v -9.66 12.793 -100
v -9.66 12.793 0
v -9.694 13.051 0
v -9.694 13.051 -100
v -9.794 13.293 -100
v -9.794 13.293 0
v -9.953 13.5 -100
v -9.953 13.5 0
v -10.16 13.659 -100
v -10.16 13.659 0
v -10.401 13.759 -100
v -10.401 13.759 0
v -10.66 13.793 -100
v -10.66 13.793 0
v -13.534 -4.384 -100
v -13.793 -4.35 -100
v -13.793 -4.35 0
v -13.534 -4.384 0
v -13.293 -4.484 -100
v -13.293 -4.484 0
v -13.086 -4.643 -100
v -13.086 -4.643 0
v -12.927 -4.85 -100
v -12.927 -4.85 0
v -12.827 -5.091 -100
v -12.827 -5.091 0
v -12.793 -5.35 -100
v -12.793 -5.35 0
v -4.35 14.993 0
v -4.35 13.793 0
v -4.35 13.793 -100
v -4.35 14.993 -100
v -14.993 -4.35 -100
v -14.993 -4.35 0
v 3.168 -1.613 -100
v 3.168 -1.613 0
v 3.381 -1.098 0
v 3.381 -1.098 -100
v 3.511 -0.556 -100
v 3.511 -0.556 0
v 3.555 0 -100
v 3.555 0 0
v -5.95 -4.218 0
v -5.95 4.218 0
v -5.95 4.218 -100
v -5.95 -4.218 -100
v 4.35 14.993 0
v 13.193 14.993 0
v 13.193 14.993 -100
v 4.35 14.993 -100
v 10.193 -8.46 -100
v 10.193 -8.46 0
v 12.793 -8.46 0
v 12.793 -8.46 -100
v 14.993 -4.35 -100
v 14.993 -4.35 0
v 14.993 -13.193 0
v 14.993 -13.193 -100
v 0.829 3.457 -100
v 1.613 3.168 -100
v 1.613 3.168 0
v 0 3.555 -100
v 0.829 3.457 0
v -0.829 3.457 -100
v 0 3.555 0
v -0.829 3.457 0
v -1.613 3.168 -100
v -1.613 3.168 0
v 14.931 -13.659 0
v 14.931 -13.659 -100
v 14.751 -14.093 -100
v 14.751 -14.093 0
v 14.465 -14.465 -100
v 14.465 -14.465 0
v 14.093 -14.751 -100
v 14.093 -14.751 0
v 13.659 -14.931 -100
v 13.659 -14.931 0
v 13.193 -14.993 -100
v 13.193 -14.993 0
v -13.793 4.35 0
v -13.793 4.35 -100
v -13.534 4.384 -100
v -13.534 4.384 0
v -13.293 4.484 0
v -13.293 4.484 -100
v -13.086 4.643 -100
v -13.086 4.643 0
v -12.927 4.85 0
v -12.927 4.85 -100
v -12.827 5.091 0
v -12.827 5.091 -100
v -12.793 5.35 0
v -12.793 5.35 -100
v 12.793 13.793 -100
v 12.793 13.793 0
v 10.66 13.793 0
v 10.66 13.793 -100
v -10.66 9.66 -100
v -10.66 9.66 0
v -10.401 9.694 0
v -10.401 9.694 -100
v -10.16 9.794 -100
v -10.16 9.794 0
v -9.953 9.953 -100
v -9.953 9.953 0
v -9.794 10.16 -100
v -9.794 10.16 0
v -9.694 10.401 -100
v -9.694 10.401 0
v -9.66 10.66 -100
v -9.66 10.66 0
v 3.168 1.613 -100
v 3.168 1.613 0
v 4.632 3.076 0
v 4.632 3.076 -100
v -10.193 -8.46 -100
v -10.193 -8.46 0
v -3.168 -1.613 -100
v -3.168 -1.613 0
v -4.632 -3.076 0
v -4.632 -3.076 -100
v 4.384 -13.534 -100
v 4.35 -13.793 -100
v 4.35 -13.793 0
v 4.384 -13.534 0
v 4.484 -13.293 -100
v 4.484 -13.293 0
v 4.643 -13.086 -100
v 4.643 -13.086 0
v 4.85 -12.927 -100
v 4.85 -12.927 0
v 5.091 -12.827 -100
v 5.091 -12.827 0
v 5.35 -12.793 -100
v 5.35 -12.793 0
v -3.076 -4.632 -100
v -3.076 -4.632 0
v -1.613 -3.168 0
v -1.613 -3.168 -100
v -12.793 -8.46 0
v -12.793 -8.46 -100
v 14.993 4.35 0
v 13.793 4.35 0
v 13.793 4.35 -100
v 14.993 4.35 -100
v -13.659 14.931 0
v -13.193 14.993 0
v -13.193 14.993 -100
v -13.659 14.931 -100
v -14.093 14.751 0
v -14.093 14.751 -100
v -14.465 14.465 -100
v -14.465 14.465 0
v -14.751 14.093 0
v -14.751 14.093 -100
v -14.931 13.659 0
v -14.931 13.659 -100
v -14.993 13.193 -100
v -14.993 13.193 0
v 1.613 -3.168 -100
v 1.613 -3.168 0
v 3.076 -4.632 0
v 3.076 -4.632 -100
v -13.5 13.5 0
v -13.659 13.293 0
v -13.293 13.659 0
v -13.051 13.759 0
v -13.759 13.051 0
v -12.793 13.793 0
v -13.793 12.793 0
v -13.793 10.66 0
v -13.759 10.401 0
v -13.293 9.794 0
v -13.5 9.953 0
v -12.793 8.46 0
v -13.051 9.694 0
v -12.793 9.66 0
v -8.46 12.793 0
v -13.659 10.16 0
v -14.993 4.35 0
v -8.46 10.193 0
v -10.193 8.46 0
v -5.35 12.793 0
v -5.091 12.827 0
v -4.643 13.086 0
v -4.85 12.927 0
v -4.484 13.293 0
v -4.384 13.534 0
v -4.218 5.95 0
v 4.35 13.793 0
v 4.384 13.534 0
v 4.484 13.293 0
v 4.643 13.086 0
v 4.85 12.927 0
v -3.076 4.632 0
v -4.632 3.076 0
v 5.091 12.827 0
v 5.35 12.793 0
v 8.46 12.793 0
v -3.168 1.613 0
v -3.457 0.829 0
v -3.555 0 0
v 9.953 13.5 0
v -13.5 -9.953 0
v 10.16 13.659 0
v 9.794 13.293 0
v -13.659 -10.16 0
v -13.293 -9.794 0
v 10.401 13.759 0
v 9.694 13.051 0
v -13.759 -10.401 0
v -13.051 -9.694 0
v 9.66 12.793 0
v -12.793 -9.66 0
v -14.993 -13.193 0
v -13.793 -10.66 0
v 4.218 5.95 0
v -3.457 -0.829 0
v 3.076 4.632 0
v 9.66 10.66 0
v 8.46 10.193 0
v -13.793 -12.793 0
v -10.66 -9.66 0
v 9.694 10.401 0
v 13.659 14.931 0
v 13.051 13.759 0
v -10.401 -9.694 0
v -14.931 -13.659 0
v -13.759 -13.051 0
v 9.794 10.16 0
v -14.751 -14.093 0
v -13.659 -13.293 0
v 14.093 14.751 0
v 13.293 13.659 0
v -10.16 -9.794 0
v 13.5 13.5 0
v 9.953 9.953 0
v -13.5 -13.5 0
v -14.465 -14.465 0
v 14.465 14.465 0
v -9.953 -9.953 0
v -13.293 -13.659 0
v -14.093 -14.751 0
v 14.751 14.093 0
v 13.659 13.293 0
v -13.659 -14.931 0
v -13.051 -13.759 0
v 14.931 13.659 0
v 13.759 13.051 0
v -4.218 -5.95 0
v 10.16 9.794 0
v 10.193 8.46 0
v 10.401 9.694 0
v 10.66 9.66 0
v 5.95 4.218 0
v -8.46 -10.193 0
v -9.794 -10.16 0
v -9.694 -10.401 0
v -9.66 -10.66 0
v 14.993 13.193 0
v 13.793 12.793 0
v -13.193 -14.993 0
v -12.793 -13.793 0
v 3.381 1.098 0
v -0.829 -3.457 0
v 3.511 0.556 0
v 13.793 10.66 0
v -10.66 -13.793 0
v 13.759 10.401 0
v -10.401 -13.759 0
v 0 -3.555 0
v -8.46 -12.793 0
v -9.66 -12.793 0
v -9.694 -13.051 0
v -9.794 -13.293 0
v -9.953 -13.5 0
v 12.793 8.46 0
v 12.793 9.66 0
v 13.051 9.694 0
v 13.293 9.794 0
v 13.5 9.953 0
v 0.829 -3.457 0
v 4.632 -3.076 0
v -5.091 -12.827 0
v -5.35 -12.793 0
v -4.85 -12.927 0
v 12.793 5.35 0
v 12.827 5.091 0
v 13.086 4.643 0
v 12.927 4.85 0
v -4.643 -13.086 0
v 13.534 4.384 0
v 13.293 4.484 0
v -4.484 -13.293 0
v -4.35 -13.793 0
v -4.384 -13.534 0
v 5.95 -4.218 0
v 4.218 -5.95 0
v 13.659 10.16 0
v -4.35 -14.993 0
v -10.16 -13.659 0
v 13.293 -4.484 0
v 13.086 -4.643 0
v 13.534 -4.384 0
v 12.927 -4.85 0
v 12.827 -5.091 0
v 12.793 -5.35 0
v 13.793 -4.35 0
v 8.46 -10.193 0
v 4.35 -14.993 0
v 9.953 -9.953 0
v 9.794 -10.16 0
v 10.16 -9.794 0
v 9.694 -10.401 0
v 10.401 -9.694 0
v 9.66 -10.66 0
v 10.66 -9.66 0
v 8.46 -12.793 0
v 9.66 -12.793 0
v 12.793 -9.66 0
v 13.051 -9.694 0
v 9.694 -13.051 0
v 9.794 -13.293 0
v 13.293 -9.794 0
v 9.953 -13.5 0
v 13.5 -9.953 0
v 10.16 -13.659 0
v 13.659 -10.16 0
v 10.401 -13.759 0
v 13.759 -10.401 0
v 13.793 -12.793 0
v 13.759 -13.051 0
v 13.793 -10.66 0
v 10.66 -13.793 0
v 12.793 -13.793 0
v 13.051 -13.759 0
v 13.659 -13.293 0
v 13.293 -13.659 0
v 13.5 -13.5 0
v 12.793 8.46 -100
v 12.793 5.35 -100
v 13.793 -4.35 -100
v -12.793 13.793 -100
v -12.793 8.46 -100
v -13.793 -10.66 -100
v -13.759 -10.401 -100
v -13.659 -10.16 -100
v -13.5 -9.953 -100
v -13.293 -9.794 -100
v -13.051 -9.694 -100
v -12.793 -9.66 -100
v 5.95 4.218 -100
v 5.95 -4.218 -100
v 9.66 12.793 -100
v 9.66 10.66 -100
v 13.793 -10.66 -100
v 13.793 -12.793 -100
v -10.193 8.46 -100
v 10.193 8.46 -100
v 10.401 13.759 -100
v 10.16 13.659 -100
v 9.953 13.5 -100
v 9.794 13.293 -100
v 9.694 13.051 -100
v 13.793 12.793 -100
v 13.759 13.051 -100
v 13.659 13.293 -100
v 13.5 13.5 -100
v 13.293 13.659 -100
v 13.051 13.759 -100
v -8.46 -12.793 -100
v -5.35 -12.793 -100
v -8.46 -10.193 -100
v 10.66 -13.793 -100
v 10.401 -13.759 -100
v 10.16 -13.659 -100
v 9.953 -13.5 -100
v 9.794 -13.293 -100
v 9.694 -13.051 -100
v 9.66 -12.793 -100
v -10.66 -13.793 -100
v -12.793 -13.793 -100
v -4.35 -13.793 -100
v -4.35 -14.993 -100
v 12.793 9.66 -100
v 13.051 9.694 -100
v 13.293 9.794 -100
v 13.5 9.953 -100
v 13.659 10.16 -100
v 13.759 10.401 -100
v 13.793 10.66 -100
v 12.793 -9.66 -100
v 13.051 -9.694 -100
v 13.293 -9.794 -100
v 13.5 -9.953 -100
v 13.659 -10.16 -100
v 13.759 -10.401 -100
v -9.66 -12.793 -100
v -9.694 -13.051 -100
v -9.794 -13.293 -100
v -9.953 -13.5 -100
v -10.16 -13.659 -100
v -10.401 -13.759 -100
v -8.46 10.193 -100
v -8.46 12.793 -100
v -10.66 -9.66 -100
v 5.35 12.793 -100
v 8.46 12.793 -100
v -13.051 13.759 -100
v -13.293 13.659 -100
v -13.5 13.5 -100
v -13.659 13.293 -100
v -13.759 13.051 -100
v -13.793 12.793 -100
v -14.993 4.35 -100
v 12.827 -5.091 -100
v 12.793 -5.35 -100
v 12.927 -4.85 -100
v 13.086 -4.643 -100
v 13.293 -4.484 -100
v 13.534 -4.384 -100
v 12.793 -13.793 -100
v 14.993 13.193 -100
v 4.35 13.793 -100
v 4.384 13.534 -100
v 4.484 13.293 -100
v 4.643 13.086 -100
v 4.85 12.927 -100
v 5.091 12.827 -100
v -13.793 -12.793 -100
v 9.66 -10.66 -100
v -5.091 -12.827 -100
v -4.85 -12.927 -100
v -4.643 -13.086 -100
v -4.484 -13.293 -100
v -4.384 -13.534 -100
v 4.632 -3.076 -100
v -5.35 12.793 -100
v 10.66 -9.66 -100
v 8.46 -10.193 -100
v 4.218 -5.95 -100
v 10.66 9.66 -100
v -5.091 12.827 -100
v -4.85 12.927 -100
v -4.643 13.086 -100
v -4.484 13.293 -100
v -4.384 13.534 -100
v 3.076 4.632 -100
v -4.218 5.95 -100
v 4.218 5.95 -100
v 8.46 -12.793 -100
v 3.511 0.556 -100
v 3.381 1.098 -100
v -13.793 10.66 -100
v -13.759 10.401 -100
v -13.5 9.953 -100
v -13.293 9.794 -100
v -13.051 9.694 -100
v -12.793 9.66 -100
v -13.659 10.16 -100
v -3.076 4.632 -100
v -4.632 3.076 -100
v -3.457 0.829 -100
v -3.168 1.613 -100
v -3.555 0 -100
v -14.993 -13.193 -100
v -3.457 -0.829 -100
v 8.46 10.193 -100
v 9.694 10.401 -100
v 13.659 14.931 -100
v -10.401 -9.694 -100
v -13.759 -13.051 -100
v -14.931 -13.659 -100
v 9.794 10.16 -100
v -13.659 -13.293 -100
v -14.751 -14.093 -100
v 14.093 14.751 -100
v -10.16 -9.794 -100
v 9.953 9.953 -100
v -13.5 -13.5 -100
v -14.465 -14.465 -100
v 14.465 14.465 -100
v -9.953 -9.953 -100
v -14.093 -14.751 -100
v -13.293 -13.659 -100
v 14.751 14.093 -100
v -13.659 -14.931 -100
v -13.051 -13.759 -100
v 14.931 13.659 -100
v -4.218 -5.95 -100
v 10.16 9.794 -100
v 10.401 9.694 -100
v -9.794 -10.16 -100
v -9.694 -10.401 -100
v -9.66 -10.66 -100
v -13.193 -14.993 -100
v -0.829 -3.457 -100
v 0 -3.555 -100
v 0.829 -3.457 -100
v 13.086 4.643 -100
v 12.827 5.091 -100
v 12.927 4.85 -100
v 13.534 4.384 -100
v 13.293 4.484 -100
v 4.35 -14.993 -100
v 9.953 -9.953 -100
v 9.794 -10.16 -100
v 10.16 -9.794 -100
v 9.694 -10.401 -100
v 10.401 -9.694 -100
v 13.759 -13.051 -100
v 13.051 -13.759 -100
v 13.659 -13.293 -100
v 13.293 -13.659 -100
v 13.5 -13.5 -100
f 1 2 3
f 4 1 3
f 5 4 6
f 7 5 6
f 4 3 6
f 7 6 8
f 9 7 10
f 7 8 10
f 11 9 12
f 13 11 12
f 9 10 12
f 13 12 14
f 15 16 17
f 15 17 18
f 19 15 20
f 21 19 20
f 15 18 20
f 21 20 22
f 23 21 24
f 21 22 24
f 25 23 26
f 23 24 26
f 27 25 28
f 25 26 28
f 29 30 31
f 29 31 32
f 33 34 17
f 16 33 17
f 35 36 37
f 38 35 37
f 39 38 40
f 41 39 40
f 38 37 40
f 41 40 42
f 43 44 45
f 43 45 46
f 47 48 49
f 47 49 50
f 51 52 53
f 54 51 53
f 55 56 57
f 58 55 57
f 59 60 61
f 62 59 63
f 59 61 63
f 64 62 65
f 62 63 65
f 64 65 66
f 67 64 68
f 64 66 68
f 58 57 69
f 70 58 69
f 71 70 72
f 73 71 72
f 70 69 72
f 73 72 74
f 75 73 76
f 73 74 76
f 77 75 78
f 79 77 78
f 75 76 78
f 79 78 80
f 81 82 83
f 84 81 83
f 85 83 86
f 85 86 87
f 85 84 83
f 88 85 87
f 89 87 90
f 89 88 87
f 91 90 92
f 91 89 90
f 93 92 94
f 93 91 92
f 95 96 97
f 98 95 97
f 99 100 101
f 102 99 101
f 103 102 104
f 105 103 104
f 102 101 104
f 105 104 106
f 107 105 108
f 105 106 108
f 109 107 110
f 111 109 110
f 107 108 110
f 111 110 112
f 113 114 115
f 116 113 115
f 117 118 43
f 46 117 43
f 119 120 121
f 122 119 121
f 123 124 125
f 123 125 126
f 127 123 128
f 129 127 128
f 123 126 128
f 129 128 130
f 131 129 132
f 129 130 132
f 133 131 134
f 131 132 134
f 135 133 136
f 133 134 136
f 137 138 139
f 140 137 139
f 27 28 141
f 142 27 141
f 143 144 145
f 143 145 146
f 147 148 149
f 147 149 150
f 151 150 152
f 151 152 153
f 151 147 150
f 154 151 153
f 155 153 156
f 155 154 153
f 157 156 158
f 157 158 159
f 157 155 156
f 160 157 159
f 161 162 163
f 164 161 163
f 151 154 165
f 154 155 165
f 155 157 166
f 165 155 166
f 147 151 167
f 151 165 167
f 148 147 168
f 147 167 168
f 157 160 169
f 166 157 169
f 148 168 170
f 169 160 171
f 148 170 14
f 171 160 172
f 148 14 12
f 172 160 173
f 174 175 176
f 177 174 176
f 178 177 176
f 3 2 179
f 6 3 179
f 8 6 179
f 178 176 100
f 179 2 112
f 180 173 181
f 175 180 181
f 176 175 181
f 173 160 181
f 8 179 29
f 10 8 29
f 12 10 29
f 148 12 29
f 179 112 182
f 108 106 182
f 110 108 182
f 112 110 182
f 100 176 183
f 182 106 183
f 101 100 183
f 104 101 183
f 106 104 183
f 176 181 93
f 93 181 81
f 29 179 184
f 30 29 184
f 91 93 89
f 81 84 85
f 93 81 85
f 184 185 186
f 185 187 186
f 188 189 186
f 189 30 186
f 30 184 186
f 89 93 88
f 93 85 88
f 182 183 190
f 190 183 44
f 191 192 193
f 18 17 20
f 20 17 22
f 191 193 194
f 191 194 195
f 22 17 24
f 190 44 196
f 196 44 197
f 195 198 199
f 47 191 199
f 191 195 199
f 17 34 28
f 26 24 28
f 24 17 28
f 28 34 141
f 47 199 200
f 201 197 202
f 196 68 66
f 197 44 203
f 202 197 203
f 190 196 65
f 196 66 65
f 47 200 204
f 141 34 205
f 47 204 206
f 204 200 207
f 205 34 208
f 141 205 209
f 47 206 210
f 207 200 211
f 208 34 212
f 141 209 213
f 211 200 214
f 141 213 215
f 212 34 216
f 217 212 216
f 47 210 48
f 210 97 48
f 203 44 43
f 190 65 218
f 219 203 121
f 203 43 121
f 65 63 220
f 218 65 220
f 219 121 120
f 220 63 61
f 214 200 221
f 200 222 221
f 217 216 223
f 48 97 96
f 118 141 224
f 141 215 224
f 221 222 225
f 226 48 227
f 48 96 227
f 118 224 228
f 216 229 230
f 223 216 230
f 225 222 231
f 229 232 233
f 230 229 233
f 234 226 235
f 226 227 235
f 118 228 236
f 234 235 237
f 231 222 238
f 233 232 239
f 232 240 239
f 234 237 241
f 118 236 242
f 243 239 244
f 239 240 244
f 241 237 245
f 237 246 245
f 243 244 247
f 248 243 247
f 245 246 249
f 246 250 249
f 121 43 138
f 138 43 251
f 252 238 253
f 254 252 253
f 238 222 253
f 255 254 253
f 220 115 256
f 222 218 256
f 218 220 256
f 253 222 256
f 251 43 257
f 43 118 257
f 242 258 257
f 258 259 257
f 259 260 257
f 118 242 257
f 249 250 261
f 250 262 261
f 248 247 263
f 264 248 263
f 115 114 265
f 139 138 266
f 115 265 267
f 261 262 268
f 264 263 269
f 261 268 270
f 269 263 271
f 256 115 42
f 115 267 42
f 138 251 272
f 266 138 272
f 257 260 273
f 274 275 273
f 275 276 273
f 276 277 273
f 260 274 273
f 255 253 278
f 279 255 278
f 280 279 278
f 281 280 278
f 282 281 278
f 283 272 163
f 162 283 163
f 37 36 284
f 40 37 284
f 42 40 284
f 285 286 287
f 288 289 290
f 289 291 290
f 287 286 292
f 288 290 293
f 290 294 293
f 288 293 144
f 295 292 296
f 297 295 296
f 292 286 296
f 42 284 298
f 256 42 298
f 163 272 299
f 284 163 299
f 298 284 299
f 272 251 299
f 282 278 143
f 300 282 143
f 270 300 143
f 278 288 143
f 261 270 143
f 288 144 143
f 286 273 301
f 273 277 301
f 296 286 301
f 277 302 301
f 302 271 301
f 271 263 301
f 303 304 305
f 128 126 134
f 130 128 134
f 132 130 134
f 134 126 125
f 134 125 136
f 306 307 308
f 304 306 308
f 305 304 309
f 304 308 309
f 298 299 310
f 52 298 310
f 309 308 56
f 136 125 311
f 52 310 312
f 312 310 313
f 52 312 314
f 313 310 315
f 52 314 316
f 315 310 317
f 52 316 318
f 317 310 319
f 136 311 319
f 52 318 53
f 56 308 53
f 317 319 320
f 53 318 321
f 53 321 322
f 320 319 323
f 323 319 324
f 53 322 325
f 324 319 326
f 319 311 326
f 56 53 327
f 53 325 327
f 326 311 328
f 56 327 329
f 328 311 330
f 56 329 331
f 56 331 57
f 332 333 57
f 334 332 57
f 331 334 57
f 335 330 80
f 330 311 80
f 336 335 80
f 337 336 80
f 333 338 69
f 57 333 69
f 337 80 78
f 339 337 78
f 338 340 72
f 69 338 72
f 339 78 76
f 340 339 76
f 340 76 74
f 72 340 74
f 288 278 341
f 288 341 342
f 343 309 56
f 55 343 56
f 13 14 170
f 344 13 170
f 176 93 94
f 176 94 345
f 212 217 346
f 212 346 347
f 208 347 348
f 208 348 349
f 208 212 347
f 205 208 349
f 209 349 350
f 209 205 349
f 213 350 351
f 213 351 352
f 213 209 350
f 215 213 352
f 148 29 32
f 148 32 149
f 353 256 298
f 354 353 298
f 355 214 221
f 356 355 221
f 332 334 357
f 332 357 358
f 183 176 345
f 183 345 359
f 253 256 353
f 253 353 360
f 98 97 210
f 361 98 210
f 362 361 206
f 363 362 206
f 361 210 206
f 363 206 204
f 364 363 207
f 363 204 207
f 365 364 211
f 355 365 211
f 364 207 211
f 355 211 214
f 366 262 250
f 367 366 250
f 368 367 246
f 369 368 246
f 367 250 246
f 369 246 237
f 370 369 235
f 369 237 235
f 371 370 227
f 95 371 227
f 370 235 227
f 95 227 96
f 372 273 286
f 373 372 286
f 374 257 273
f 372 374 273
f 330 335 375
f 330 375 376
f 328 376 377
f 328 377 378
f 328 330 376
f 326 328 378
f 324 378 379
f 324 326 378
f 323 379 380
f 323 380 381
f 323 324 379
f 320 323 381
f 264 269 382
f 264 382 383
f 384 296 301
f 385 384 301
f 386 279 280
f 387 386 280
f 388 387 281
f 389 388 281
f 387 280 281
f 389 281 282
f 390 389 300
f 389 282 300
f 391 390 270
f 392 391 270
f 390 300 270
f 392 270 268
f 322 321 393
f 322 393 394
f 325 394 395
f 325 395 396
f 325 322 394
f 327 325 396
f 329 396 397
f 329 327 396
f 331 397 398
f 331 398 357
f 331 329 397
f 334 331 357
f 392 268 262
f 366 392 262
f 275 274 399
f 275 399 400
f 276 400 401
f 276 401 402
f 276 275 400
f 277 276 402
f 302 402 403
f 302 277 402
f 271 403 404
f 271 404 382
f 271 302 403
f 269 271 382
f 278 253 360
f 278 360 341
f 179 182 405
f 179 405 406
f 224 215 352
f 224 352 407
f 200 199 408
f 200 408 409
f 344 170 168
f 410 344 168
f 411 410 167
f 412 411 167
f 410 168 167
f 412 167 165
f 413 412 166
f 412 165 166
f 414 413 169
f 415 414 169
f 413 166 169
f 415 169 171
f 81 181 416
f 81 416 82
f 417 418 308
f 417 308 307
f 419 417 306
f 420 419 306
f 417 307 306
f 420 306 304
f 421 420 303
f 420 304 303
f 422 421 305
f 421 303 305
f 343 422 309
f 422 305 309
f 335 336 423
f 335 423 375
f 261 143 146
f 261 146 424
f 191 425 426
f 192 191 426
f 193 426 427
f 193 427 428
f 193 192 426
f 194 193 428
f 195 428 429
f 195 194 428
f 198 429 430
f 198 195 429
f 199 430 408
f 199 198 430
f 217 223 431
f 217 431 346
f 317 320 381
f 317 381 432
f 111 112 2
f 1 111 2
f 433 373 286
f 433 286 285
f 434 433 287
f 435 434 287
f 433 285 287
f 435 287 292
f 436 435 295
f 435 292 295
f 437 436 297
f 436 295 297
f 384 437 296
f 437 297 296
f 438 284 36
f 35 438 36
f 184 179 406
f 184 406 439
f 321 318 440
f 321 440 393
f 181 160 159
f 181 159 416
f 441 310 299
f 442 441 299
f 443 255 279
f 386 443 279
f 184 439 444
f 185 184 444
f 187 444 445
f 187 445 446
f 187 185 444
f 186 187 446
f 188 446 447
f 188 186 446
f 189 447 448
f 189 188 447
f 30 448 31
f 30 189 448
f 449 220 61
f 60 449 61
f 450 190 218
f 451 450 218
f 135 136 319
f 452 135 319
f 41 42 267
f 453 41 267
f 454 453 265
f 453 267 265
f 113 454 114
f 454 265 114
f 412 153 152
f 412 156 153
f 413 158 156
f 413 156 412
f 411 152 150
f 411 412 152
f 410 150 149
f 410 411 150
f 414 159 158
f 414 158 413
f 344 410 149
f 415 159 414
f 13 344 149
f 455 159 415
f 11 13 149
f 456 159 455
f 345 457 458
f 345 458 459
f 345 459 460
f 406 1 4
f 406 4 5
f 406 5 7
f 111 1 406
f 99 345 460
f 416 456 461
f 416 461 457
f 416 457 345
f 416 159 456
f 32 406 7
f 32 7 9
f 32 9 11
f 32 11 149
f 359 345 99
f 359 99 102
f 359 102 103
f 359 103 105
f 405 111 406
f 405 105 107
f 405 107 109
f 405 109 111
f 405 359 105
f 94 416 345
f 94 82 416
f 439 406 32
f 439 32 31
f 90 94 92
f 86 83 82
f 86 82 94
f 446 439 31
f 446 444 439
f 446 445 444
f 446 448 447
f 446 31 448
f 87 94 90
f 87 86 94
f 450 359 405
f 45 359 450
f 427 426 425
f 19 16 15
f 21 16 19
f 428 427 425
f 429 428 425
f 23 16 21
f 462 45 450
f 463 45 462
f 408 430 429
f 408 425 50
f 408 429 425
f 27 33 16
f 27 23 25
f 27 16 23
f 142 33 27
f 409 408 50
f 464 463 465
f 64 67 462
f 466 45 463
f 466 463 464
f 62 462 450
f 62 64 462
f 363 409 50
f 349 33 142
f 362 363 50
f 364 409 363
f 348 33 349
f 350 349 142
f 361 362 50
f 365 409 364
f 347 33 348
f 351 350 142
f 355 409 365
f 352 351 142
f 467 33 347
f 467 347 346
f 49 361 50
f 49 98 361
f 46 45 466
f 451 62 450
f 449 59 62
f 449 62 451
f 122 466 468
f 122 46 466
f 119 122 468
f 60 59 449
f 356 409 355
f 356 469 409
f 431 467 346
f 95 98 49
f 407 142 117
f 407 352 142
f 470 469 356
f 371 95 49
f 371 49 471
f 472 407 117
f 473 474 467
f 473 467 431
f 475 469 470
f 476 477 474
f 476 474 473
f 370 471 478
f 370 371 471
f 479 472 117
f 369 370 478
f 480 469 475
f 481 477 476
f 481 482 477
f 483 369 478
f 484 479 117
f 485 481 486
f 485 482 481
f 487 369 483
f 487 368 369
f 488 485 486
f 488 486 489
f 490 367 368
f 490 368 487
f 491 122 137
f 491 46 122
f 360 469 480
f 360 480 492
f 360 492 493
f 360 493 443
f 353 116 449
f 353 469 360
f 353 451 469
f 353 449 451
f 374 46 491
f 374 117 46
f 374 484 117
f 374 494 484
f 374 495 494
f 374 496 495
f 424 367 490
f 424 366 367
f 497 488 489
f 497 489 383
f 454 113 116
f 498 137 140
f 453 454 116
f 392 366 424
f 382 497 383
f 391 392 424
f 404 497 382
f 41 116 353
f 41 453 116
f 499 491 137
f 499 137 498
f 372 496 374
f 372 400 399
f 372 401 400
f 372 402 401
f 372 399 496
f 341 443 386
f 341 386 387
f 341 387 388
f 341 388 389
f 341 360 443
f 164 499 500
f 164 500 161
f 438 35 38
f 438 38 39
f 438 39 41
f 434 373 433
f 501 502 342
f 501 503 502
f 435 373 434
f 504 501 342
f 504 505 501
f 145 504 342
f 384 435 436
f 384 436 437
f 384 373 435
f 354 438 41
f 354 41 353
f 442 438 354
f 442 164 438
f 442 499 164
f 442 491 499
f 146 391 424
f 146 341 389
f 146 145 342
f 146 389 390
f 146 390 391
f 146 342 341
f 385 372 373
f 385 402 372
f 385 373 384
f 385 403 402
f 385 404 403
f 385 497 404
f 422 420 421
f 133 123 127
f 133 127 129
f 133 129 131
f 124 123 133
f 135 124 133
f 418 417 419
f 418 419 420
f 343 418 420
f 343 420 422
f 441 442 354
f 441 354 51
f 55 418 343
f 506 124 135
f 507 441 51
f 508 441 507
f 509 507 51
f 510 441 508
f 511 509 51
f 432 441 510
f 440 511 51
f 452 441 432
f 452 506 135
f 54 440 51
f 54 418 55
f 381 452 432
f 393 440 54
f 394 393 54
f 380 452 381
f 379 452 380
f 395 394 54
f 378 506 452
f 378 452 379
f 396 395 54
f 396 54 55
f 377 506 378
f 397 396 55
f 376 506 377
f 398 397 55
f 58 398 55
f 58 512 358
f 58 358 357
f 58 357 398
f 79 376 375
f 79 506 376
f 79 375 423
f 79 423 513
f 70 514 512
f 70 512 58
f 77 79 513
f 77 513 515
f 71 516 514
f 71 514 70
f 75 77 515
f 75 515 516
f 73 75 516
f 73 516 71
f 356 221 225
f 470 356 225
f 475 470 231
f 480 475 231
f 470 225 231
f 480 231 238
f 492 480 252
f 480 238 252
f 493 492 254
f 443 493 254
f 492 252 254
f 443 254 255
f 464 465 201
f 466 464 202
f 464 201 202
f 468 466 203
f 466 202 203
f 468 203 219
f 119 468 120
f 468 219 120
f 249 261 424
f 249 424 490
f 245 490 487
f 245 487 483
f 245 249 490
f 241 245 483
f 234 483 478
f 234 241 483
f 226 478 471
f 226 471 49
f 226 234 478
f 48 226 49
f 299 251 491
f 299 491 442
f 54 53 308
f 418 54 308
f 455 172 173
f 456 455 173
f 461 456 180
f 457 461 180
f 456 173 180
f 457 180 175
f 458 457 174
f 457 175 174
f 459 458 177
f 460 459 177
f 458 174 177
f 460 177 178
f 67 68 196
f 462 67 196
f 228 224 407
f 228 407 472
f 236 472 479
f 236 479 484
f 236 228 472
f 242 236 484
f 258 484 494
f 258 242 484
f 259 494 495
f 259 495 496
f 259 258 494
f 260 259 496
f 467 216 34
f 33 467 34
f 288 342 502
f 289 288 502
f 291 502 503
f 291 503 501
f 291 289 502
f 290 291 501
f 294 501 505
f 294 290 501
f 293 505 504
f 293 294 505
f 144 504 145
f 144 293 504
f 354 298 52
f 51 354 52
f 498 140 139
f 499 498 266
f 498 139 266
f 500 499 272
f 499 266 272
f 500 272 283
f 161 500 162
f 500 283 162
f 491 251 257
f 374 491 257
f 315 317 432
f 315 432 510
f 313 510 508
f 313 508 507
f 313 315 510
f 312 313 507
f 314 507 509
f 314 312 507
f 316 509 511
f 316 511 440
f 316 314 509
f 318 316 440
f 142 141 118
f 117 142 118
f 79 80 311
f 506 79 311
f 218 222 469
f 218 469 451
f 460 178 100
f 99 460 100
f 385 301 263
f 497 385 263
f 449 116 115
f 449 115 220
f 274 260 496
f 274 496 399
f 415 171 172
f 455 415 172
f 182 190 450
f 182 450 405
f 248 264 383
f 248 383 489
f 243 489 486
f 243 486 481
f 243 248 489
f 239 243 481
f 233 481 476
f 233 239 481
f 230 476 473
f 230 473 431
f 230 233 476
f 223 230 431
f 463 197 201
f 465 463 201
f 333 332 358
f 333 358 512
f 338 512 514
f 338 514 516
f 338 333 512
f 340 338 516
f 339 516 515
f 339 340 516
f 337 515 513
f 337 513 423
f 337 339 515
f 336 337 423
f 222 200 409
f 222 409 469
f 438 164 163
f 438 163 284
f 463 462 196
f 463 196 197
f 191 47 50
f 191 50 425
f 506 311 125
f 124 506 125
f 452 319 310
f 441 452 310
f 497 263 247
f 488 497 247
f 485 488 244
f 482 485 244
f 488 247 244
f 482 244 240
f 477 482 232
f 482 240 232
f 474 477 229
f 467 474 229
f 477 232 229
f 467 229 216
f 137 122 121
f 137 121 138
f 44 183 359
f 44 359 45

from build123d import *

# Parameters (mm, degrees)
SKETCH1_W           = 11.9
SKETCH1_H           = 5.95
BOSS_EXTRUDE1_DEPTH = 100
CUT_EXTRUDE1_DEPTH  = 101


with BuildPart() as part:
    # Sketch1 → Boss-Extrude1 (new body)
    with BuildSketch(Plane.XY):
        with BuildLine():
            Line((-4.350229073, 14.992640687), (-13.192640687, 14.992640687))
            ThreePointArc((-13.192640687, 14.992640687), (-14.465432893, 14.465432893), (-14.992640687, 13.192640687))
            Line((-14.992640687, 13.192640687), (-14.992640687, 4.350229073))
            Line((-14.992640687, 4.350229073), (-13.792640687, 4.350229073))
            ThreePointArc((-13.792640687, 4.350229073), (-13.085533906, 4.643122292), (-12.792640687, 5.350229073))
            Line((-12.792640687, 5.350229073), (-12.792640687, 8.460229073))
            Line((-12.792640687, 8.460229073), (-8.460229073, 8.460229073))
            Line((-8.460229073, 8.460229073), (-8.460229073, 12.792640687))
            Line((-8.460229073, 12.792640687), (-5.350229073, 12.792640687))
            ThreePointArc((-5.350229073, 12.792640687), (-4.643122292, 13.085533906), (-4.350229073, 13.792640687))
            Line((-4.350229073, 13.792640687), (-4.350229073, 14.992640687))
        make_face()
        with BuildLine():
            Line((-10.660229073, 13.792640687), (-12.792640687, 13.792640687))
            ThreePointArc((-12.792640687, 13.792640687), (-13.499747468, 13.499747468), (-13.792640687, 12.792640687))
            Line((-13.792640687, 12.792640687), (-13.792640687, 10.660229073))
            ThreePointArc((-13.792640687, 10.660229073), (-13.499747468, 9.953122292), (-12.792640687, 9.660229073))
            Line((-12.792640687, 9.660229073), (-10.660229073, 9.660229073))
            ThreePointArc((-10.660229073, 9.660229073), (-9.953122292, 9.953122292), (-9.660229073, 10.660229073))
            Line((-9.660229073, 10.660229073), (-9.660229073, 12.792640687))
            ThreePointArc((-9.660229073, 12.792640687), (-9.953122292, 13.499747468), (-10.660229073, 13.792640687))
        make_face(mode=Mode.SUBTRACT)
        Polygon((-5.95, 4.217588386), (-5.95, 5.95), (-4.217588386, 5.95), (-8.460229073, 10.192640687), (-8.460229073, 8.460229073), (-10.192640687, 8.460229073), align=None)
        with Locations((0, 2.975)):
            Rectangle(SKETCH1_W, SKETCH1_H)
        Polygon((8.460229073, 10.192640687), (4.217588386, 5.95), (5.95, 5.95), (5.95, 4.217588386), (10.192640687, 8.460229073), (8.460229073, 8.460229073), align=None)
        with BuildLine():
            Line((12.792640687, 8.460229073), (12.792640687, 5.350229073))
            ThreePointArc((12.792640687, 5.350229073), (13.085533906, 4.643122292), (13.792640687, 4.350229073))
            Line((13.792640687, 4.350229073), (14.992640687, 4.350229073))
            Line((14.992640687, 4.350229073), (14.992640687, 13.192640687))
            ThreePointArc((14.992640687, 13.192640687), (14.465432893, 14.465432893), (13.192640687, 14.992640687))
            Line((13.192640687, 14.992640687), (4.350229073, 14.992640687))
            Line((4.350229073, 14.992640687), (4.350229073, 13.792640687))
            ThreePointArc((4.350229073, 13.792640687), (4.643122292, 13.085533906), (5.350229073, 12.792640687))
            Line((5.350229073, 12.792640687), (8.460229073, 12.792640687))
            Line((8.460229073, 12.792640687), (8.460229073, 8.460229073))
            Line((8.460229073, 8.460229073), (12.792640687, 8.460229073))
        make_face()
        with BuildLine():
            ThreePointArc((9.660229073, 10.660229073), (9.953122292, 9.953122292), (10.660229073, 9.660229073))
            Line((10.660229073, 9.660229073), (12.792640687, 9.660229073))
            ThreePointArc((12.792640687, 9.660229073), (13.499747468, 9.953122292), (13.792640687, 10.660229073))
            Line((13.792640687, 10.660229073), (13.792640687, 12.792640687))
            ThreePointArc((13.792640687, 12.792640687), (13.499747468, 13.499747468), (12.792640687, 13.792640687))
            Line((12.792640687, 13.792640687), (10.660229073, 13.792640687))
            ThreePointArc((10.660229073, 13.792640687), (9.953122292, 13.499747468), (9.660229073, 12.792640687))
            Line((9.660229073, 12.792640687), (9.660229073, 10.660229073))
        make_face(mode=Mode.SUBTRACT)
    extrude(amount=-BOSS_EXTRUDE1_DEPTH)

    # Mirror1: part across plane


with BuildPart() as part_1:
    add(part.part)
    add(part.part.mirror(Plane(origin=(0, 0, -100), x_dir=(0, 0, 1), z_dir=(0, -1, 0))))

    # Sketch2 → Cut-Extrude1 (cut, through all)
    with BuildSketch(Plane.XY):
        with BuildLine():
            Line((-4.631549417, 3.075914498), (-3.16821753, 1.612582612))
            ThreePointArc((-3.16821753, 1.612582612), (-2.513764607, 2.513764607), (-1.612582612, 3.16821753))
            Line((-1.612582612, 3.16821753), (-3.075914498, 4.631549417))
            Line((-3.075914498, 4.631549417), (-4.631549417, 3.075914498))
        make_face()
        with BuildLine():
            Line((-3.16821753, 1.612582612), (-1.555634919, 0))
            Line((-1.555634919, 0), (0, 1.555634919))
            Line((0, 1.555634919), (-1.612582612, 3.16821753))
            ThreePointArc((-1.612582612, 3.16821753), (-2.513764607, 2.513764607), (-3.16821753, 1.612582612))
        make_face()
        with BuildLine():
            ThreePointArc((-3.16821753, 1.612582612), (-3.555, 0), (-3.16821753, -1.612582612))
            Line((-3.16821753, -1.612582612), (-1.555634919, 0))
            Line((-1.555634919, 0), (-3.16821753, 1.612582612))
        make_face()
        with BuildLine():
            Line((-4.631549417, -3.075914498), (-3.075914498, -4.631549417))
            Line((-3.075914498, -4.631549417), (-1.612582612, -3.16821753))
            ThreePointArc((-1.612582612, -3.16821753), (-2.513764607, -2.513764607), (-3.16821753, -1.612582612))
            Line((-3.16821753, -1.612582612), (-4.631549417, -3.075914498))
        make_face()
        with BuildLine():
            ThreePointArc((-3.16821753, -1.612582612), (-2.513764607, -2.513764607), (-1.612582612, -3.16821753))
            Line((-1.612582612, -3.16821753), (0, -1.555634919))
            Line((0, -1.555634919), (-1.555634919, 0))
            Line((-1.555634919, 0), (-3.16821753, -1.612582612))
        make_face()
        with BuildLine():
            Line((0, -1.555634919), (-1.612582612, -3.16821753))
            ThreePointArc((-1.612582612, -3.16821753), (0, -3.555), (1.612582612, -3.16821753))
            Line((1.612582612, -3.16821753), (0, -1.555634919))
        make_face()
        with BuildLine():
            Line((1.555634919, 0), (0, -1.555634919))
            Line((0, -1.555634919), (1.612582612, -3.16821753))
            ThreePointArc((1.612582612, -3.16821753), (2.513764607, -2.513764607), (3.16821753, -1.612582612))
            Line((3.16821753, -1.612582612), (1.555634919, 0))
        make_face()
        with BuildLine():
            Line((3.16821753, 1.612582612), (1.555634919, 0))
            Line((1.555634919, 0), (3.16821753, -1.612582612))
            ThreePointArc((3.16821753, -1.612582612), (3.456952294, -0.829159719), (3.555, 0))
            ThreePointArc((3.555, 0), (3.456952294, 0.829159719), (3.16821753, 1.612582612))
        make_face()
        Polygon((-1.555634919, 0), (0, -1.555634919), (1.555634919, 0), (0, 1.555634919), align=None)
        with BuildLine():
            Line((0, 1.555634919), (1.555634919, 0))
            Line((1.555634919, 0), (3.16821753, 1.612582612))
            ThreePointArc((3.16821753, 1.612582612), (2.513764607, 2.513764607), (1.612582612, 3.16821753))
            Line((1.612582612, 3.16821753), (0, 1.555634919))
        make_face()
        with BuildLine():
            Line((-1.612582612, 3.16821753), (0, 1.555634919))
            Line((0, 1.555634919), (1.612582612, 3.16821753))
            ThreePointArc((1.612582612, 3.16821753), (0, 3.555), (-1.612582612, 3.16821753))
        make_face()
        with BuildLine():
            ThreePointArc((1.612582612, 3.16821753), (2.513764607, 2.513764607), (3.16821753, 1.612582612))
            Line((3.16821753, 1.612582612), (4.631549417, 3.075914498))
            Line((4.631549417, 3.075914498), (3.075914498, 4.631549417))
            Line((3.075914498, 4.631549417), (1.612582612, 3.16821753))
        make_face()
        with BuildLine():
            ThreePointArc((3.16821753, -1.612582612), (2.513764607, -2.513764607), (1.612582612, -3.16821753))
            Line((1.612582612, -3.16821753), (3.075914498, -4.631549417))
            Line((3.075914498, -4.631549417), (4.631549417, -3.075914498))
            Line((4.631549417, -3.075914498), (3.16821753, -1.612582612))
        make_face()
    extrude(amount=-CUT_EXTRUDE1_DEPTH, mode=Mode.SUBTRACT)


solid = part_1.part
